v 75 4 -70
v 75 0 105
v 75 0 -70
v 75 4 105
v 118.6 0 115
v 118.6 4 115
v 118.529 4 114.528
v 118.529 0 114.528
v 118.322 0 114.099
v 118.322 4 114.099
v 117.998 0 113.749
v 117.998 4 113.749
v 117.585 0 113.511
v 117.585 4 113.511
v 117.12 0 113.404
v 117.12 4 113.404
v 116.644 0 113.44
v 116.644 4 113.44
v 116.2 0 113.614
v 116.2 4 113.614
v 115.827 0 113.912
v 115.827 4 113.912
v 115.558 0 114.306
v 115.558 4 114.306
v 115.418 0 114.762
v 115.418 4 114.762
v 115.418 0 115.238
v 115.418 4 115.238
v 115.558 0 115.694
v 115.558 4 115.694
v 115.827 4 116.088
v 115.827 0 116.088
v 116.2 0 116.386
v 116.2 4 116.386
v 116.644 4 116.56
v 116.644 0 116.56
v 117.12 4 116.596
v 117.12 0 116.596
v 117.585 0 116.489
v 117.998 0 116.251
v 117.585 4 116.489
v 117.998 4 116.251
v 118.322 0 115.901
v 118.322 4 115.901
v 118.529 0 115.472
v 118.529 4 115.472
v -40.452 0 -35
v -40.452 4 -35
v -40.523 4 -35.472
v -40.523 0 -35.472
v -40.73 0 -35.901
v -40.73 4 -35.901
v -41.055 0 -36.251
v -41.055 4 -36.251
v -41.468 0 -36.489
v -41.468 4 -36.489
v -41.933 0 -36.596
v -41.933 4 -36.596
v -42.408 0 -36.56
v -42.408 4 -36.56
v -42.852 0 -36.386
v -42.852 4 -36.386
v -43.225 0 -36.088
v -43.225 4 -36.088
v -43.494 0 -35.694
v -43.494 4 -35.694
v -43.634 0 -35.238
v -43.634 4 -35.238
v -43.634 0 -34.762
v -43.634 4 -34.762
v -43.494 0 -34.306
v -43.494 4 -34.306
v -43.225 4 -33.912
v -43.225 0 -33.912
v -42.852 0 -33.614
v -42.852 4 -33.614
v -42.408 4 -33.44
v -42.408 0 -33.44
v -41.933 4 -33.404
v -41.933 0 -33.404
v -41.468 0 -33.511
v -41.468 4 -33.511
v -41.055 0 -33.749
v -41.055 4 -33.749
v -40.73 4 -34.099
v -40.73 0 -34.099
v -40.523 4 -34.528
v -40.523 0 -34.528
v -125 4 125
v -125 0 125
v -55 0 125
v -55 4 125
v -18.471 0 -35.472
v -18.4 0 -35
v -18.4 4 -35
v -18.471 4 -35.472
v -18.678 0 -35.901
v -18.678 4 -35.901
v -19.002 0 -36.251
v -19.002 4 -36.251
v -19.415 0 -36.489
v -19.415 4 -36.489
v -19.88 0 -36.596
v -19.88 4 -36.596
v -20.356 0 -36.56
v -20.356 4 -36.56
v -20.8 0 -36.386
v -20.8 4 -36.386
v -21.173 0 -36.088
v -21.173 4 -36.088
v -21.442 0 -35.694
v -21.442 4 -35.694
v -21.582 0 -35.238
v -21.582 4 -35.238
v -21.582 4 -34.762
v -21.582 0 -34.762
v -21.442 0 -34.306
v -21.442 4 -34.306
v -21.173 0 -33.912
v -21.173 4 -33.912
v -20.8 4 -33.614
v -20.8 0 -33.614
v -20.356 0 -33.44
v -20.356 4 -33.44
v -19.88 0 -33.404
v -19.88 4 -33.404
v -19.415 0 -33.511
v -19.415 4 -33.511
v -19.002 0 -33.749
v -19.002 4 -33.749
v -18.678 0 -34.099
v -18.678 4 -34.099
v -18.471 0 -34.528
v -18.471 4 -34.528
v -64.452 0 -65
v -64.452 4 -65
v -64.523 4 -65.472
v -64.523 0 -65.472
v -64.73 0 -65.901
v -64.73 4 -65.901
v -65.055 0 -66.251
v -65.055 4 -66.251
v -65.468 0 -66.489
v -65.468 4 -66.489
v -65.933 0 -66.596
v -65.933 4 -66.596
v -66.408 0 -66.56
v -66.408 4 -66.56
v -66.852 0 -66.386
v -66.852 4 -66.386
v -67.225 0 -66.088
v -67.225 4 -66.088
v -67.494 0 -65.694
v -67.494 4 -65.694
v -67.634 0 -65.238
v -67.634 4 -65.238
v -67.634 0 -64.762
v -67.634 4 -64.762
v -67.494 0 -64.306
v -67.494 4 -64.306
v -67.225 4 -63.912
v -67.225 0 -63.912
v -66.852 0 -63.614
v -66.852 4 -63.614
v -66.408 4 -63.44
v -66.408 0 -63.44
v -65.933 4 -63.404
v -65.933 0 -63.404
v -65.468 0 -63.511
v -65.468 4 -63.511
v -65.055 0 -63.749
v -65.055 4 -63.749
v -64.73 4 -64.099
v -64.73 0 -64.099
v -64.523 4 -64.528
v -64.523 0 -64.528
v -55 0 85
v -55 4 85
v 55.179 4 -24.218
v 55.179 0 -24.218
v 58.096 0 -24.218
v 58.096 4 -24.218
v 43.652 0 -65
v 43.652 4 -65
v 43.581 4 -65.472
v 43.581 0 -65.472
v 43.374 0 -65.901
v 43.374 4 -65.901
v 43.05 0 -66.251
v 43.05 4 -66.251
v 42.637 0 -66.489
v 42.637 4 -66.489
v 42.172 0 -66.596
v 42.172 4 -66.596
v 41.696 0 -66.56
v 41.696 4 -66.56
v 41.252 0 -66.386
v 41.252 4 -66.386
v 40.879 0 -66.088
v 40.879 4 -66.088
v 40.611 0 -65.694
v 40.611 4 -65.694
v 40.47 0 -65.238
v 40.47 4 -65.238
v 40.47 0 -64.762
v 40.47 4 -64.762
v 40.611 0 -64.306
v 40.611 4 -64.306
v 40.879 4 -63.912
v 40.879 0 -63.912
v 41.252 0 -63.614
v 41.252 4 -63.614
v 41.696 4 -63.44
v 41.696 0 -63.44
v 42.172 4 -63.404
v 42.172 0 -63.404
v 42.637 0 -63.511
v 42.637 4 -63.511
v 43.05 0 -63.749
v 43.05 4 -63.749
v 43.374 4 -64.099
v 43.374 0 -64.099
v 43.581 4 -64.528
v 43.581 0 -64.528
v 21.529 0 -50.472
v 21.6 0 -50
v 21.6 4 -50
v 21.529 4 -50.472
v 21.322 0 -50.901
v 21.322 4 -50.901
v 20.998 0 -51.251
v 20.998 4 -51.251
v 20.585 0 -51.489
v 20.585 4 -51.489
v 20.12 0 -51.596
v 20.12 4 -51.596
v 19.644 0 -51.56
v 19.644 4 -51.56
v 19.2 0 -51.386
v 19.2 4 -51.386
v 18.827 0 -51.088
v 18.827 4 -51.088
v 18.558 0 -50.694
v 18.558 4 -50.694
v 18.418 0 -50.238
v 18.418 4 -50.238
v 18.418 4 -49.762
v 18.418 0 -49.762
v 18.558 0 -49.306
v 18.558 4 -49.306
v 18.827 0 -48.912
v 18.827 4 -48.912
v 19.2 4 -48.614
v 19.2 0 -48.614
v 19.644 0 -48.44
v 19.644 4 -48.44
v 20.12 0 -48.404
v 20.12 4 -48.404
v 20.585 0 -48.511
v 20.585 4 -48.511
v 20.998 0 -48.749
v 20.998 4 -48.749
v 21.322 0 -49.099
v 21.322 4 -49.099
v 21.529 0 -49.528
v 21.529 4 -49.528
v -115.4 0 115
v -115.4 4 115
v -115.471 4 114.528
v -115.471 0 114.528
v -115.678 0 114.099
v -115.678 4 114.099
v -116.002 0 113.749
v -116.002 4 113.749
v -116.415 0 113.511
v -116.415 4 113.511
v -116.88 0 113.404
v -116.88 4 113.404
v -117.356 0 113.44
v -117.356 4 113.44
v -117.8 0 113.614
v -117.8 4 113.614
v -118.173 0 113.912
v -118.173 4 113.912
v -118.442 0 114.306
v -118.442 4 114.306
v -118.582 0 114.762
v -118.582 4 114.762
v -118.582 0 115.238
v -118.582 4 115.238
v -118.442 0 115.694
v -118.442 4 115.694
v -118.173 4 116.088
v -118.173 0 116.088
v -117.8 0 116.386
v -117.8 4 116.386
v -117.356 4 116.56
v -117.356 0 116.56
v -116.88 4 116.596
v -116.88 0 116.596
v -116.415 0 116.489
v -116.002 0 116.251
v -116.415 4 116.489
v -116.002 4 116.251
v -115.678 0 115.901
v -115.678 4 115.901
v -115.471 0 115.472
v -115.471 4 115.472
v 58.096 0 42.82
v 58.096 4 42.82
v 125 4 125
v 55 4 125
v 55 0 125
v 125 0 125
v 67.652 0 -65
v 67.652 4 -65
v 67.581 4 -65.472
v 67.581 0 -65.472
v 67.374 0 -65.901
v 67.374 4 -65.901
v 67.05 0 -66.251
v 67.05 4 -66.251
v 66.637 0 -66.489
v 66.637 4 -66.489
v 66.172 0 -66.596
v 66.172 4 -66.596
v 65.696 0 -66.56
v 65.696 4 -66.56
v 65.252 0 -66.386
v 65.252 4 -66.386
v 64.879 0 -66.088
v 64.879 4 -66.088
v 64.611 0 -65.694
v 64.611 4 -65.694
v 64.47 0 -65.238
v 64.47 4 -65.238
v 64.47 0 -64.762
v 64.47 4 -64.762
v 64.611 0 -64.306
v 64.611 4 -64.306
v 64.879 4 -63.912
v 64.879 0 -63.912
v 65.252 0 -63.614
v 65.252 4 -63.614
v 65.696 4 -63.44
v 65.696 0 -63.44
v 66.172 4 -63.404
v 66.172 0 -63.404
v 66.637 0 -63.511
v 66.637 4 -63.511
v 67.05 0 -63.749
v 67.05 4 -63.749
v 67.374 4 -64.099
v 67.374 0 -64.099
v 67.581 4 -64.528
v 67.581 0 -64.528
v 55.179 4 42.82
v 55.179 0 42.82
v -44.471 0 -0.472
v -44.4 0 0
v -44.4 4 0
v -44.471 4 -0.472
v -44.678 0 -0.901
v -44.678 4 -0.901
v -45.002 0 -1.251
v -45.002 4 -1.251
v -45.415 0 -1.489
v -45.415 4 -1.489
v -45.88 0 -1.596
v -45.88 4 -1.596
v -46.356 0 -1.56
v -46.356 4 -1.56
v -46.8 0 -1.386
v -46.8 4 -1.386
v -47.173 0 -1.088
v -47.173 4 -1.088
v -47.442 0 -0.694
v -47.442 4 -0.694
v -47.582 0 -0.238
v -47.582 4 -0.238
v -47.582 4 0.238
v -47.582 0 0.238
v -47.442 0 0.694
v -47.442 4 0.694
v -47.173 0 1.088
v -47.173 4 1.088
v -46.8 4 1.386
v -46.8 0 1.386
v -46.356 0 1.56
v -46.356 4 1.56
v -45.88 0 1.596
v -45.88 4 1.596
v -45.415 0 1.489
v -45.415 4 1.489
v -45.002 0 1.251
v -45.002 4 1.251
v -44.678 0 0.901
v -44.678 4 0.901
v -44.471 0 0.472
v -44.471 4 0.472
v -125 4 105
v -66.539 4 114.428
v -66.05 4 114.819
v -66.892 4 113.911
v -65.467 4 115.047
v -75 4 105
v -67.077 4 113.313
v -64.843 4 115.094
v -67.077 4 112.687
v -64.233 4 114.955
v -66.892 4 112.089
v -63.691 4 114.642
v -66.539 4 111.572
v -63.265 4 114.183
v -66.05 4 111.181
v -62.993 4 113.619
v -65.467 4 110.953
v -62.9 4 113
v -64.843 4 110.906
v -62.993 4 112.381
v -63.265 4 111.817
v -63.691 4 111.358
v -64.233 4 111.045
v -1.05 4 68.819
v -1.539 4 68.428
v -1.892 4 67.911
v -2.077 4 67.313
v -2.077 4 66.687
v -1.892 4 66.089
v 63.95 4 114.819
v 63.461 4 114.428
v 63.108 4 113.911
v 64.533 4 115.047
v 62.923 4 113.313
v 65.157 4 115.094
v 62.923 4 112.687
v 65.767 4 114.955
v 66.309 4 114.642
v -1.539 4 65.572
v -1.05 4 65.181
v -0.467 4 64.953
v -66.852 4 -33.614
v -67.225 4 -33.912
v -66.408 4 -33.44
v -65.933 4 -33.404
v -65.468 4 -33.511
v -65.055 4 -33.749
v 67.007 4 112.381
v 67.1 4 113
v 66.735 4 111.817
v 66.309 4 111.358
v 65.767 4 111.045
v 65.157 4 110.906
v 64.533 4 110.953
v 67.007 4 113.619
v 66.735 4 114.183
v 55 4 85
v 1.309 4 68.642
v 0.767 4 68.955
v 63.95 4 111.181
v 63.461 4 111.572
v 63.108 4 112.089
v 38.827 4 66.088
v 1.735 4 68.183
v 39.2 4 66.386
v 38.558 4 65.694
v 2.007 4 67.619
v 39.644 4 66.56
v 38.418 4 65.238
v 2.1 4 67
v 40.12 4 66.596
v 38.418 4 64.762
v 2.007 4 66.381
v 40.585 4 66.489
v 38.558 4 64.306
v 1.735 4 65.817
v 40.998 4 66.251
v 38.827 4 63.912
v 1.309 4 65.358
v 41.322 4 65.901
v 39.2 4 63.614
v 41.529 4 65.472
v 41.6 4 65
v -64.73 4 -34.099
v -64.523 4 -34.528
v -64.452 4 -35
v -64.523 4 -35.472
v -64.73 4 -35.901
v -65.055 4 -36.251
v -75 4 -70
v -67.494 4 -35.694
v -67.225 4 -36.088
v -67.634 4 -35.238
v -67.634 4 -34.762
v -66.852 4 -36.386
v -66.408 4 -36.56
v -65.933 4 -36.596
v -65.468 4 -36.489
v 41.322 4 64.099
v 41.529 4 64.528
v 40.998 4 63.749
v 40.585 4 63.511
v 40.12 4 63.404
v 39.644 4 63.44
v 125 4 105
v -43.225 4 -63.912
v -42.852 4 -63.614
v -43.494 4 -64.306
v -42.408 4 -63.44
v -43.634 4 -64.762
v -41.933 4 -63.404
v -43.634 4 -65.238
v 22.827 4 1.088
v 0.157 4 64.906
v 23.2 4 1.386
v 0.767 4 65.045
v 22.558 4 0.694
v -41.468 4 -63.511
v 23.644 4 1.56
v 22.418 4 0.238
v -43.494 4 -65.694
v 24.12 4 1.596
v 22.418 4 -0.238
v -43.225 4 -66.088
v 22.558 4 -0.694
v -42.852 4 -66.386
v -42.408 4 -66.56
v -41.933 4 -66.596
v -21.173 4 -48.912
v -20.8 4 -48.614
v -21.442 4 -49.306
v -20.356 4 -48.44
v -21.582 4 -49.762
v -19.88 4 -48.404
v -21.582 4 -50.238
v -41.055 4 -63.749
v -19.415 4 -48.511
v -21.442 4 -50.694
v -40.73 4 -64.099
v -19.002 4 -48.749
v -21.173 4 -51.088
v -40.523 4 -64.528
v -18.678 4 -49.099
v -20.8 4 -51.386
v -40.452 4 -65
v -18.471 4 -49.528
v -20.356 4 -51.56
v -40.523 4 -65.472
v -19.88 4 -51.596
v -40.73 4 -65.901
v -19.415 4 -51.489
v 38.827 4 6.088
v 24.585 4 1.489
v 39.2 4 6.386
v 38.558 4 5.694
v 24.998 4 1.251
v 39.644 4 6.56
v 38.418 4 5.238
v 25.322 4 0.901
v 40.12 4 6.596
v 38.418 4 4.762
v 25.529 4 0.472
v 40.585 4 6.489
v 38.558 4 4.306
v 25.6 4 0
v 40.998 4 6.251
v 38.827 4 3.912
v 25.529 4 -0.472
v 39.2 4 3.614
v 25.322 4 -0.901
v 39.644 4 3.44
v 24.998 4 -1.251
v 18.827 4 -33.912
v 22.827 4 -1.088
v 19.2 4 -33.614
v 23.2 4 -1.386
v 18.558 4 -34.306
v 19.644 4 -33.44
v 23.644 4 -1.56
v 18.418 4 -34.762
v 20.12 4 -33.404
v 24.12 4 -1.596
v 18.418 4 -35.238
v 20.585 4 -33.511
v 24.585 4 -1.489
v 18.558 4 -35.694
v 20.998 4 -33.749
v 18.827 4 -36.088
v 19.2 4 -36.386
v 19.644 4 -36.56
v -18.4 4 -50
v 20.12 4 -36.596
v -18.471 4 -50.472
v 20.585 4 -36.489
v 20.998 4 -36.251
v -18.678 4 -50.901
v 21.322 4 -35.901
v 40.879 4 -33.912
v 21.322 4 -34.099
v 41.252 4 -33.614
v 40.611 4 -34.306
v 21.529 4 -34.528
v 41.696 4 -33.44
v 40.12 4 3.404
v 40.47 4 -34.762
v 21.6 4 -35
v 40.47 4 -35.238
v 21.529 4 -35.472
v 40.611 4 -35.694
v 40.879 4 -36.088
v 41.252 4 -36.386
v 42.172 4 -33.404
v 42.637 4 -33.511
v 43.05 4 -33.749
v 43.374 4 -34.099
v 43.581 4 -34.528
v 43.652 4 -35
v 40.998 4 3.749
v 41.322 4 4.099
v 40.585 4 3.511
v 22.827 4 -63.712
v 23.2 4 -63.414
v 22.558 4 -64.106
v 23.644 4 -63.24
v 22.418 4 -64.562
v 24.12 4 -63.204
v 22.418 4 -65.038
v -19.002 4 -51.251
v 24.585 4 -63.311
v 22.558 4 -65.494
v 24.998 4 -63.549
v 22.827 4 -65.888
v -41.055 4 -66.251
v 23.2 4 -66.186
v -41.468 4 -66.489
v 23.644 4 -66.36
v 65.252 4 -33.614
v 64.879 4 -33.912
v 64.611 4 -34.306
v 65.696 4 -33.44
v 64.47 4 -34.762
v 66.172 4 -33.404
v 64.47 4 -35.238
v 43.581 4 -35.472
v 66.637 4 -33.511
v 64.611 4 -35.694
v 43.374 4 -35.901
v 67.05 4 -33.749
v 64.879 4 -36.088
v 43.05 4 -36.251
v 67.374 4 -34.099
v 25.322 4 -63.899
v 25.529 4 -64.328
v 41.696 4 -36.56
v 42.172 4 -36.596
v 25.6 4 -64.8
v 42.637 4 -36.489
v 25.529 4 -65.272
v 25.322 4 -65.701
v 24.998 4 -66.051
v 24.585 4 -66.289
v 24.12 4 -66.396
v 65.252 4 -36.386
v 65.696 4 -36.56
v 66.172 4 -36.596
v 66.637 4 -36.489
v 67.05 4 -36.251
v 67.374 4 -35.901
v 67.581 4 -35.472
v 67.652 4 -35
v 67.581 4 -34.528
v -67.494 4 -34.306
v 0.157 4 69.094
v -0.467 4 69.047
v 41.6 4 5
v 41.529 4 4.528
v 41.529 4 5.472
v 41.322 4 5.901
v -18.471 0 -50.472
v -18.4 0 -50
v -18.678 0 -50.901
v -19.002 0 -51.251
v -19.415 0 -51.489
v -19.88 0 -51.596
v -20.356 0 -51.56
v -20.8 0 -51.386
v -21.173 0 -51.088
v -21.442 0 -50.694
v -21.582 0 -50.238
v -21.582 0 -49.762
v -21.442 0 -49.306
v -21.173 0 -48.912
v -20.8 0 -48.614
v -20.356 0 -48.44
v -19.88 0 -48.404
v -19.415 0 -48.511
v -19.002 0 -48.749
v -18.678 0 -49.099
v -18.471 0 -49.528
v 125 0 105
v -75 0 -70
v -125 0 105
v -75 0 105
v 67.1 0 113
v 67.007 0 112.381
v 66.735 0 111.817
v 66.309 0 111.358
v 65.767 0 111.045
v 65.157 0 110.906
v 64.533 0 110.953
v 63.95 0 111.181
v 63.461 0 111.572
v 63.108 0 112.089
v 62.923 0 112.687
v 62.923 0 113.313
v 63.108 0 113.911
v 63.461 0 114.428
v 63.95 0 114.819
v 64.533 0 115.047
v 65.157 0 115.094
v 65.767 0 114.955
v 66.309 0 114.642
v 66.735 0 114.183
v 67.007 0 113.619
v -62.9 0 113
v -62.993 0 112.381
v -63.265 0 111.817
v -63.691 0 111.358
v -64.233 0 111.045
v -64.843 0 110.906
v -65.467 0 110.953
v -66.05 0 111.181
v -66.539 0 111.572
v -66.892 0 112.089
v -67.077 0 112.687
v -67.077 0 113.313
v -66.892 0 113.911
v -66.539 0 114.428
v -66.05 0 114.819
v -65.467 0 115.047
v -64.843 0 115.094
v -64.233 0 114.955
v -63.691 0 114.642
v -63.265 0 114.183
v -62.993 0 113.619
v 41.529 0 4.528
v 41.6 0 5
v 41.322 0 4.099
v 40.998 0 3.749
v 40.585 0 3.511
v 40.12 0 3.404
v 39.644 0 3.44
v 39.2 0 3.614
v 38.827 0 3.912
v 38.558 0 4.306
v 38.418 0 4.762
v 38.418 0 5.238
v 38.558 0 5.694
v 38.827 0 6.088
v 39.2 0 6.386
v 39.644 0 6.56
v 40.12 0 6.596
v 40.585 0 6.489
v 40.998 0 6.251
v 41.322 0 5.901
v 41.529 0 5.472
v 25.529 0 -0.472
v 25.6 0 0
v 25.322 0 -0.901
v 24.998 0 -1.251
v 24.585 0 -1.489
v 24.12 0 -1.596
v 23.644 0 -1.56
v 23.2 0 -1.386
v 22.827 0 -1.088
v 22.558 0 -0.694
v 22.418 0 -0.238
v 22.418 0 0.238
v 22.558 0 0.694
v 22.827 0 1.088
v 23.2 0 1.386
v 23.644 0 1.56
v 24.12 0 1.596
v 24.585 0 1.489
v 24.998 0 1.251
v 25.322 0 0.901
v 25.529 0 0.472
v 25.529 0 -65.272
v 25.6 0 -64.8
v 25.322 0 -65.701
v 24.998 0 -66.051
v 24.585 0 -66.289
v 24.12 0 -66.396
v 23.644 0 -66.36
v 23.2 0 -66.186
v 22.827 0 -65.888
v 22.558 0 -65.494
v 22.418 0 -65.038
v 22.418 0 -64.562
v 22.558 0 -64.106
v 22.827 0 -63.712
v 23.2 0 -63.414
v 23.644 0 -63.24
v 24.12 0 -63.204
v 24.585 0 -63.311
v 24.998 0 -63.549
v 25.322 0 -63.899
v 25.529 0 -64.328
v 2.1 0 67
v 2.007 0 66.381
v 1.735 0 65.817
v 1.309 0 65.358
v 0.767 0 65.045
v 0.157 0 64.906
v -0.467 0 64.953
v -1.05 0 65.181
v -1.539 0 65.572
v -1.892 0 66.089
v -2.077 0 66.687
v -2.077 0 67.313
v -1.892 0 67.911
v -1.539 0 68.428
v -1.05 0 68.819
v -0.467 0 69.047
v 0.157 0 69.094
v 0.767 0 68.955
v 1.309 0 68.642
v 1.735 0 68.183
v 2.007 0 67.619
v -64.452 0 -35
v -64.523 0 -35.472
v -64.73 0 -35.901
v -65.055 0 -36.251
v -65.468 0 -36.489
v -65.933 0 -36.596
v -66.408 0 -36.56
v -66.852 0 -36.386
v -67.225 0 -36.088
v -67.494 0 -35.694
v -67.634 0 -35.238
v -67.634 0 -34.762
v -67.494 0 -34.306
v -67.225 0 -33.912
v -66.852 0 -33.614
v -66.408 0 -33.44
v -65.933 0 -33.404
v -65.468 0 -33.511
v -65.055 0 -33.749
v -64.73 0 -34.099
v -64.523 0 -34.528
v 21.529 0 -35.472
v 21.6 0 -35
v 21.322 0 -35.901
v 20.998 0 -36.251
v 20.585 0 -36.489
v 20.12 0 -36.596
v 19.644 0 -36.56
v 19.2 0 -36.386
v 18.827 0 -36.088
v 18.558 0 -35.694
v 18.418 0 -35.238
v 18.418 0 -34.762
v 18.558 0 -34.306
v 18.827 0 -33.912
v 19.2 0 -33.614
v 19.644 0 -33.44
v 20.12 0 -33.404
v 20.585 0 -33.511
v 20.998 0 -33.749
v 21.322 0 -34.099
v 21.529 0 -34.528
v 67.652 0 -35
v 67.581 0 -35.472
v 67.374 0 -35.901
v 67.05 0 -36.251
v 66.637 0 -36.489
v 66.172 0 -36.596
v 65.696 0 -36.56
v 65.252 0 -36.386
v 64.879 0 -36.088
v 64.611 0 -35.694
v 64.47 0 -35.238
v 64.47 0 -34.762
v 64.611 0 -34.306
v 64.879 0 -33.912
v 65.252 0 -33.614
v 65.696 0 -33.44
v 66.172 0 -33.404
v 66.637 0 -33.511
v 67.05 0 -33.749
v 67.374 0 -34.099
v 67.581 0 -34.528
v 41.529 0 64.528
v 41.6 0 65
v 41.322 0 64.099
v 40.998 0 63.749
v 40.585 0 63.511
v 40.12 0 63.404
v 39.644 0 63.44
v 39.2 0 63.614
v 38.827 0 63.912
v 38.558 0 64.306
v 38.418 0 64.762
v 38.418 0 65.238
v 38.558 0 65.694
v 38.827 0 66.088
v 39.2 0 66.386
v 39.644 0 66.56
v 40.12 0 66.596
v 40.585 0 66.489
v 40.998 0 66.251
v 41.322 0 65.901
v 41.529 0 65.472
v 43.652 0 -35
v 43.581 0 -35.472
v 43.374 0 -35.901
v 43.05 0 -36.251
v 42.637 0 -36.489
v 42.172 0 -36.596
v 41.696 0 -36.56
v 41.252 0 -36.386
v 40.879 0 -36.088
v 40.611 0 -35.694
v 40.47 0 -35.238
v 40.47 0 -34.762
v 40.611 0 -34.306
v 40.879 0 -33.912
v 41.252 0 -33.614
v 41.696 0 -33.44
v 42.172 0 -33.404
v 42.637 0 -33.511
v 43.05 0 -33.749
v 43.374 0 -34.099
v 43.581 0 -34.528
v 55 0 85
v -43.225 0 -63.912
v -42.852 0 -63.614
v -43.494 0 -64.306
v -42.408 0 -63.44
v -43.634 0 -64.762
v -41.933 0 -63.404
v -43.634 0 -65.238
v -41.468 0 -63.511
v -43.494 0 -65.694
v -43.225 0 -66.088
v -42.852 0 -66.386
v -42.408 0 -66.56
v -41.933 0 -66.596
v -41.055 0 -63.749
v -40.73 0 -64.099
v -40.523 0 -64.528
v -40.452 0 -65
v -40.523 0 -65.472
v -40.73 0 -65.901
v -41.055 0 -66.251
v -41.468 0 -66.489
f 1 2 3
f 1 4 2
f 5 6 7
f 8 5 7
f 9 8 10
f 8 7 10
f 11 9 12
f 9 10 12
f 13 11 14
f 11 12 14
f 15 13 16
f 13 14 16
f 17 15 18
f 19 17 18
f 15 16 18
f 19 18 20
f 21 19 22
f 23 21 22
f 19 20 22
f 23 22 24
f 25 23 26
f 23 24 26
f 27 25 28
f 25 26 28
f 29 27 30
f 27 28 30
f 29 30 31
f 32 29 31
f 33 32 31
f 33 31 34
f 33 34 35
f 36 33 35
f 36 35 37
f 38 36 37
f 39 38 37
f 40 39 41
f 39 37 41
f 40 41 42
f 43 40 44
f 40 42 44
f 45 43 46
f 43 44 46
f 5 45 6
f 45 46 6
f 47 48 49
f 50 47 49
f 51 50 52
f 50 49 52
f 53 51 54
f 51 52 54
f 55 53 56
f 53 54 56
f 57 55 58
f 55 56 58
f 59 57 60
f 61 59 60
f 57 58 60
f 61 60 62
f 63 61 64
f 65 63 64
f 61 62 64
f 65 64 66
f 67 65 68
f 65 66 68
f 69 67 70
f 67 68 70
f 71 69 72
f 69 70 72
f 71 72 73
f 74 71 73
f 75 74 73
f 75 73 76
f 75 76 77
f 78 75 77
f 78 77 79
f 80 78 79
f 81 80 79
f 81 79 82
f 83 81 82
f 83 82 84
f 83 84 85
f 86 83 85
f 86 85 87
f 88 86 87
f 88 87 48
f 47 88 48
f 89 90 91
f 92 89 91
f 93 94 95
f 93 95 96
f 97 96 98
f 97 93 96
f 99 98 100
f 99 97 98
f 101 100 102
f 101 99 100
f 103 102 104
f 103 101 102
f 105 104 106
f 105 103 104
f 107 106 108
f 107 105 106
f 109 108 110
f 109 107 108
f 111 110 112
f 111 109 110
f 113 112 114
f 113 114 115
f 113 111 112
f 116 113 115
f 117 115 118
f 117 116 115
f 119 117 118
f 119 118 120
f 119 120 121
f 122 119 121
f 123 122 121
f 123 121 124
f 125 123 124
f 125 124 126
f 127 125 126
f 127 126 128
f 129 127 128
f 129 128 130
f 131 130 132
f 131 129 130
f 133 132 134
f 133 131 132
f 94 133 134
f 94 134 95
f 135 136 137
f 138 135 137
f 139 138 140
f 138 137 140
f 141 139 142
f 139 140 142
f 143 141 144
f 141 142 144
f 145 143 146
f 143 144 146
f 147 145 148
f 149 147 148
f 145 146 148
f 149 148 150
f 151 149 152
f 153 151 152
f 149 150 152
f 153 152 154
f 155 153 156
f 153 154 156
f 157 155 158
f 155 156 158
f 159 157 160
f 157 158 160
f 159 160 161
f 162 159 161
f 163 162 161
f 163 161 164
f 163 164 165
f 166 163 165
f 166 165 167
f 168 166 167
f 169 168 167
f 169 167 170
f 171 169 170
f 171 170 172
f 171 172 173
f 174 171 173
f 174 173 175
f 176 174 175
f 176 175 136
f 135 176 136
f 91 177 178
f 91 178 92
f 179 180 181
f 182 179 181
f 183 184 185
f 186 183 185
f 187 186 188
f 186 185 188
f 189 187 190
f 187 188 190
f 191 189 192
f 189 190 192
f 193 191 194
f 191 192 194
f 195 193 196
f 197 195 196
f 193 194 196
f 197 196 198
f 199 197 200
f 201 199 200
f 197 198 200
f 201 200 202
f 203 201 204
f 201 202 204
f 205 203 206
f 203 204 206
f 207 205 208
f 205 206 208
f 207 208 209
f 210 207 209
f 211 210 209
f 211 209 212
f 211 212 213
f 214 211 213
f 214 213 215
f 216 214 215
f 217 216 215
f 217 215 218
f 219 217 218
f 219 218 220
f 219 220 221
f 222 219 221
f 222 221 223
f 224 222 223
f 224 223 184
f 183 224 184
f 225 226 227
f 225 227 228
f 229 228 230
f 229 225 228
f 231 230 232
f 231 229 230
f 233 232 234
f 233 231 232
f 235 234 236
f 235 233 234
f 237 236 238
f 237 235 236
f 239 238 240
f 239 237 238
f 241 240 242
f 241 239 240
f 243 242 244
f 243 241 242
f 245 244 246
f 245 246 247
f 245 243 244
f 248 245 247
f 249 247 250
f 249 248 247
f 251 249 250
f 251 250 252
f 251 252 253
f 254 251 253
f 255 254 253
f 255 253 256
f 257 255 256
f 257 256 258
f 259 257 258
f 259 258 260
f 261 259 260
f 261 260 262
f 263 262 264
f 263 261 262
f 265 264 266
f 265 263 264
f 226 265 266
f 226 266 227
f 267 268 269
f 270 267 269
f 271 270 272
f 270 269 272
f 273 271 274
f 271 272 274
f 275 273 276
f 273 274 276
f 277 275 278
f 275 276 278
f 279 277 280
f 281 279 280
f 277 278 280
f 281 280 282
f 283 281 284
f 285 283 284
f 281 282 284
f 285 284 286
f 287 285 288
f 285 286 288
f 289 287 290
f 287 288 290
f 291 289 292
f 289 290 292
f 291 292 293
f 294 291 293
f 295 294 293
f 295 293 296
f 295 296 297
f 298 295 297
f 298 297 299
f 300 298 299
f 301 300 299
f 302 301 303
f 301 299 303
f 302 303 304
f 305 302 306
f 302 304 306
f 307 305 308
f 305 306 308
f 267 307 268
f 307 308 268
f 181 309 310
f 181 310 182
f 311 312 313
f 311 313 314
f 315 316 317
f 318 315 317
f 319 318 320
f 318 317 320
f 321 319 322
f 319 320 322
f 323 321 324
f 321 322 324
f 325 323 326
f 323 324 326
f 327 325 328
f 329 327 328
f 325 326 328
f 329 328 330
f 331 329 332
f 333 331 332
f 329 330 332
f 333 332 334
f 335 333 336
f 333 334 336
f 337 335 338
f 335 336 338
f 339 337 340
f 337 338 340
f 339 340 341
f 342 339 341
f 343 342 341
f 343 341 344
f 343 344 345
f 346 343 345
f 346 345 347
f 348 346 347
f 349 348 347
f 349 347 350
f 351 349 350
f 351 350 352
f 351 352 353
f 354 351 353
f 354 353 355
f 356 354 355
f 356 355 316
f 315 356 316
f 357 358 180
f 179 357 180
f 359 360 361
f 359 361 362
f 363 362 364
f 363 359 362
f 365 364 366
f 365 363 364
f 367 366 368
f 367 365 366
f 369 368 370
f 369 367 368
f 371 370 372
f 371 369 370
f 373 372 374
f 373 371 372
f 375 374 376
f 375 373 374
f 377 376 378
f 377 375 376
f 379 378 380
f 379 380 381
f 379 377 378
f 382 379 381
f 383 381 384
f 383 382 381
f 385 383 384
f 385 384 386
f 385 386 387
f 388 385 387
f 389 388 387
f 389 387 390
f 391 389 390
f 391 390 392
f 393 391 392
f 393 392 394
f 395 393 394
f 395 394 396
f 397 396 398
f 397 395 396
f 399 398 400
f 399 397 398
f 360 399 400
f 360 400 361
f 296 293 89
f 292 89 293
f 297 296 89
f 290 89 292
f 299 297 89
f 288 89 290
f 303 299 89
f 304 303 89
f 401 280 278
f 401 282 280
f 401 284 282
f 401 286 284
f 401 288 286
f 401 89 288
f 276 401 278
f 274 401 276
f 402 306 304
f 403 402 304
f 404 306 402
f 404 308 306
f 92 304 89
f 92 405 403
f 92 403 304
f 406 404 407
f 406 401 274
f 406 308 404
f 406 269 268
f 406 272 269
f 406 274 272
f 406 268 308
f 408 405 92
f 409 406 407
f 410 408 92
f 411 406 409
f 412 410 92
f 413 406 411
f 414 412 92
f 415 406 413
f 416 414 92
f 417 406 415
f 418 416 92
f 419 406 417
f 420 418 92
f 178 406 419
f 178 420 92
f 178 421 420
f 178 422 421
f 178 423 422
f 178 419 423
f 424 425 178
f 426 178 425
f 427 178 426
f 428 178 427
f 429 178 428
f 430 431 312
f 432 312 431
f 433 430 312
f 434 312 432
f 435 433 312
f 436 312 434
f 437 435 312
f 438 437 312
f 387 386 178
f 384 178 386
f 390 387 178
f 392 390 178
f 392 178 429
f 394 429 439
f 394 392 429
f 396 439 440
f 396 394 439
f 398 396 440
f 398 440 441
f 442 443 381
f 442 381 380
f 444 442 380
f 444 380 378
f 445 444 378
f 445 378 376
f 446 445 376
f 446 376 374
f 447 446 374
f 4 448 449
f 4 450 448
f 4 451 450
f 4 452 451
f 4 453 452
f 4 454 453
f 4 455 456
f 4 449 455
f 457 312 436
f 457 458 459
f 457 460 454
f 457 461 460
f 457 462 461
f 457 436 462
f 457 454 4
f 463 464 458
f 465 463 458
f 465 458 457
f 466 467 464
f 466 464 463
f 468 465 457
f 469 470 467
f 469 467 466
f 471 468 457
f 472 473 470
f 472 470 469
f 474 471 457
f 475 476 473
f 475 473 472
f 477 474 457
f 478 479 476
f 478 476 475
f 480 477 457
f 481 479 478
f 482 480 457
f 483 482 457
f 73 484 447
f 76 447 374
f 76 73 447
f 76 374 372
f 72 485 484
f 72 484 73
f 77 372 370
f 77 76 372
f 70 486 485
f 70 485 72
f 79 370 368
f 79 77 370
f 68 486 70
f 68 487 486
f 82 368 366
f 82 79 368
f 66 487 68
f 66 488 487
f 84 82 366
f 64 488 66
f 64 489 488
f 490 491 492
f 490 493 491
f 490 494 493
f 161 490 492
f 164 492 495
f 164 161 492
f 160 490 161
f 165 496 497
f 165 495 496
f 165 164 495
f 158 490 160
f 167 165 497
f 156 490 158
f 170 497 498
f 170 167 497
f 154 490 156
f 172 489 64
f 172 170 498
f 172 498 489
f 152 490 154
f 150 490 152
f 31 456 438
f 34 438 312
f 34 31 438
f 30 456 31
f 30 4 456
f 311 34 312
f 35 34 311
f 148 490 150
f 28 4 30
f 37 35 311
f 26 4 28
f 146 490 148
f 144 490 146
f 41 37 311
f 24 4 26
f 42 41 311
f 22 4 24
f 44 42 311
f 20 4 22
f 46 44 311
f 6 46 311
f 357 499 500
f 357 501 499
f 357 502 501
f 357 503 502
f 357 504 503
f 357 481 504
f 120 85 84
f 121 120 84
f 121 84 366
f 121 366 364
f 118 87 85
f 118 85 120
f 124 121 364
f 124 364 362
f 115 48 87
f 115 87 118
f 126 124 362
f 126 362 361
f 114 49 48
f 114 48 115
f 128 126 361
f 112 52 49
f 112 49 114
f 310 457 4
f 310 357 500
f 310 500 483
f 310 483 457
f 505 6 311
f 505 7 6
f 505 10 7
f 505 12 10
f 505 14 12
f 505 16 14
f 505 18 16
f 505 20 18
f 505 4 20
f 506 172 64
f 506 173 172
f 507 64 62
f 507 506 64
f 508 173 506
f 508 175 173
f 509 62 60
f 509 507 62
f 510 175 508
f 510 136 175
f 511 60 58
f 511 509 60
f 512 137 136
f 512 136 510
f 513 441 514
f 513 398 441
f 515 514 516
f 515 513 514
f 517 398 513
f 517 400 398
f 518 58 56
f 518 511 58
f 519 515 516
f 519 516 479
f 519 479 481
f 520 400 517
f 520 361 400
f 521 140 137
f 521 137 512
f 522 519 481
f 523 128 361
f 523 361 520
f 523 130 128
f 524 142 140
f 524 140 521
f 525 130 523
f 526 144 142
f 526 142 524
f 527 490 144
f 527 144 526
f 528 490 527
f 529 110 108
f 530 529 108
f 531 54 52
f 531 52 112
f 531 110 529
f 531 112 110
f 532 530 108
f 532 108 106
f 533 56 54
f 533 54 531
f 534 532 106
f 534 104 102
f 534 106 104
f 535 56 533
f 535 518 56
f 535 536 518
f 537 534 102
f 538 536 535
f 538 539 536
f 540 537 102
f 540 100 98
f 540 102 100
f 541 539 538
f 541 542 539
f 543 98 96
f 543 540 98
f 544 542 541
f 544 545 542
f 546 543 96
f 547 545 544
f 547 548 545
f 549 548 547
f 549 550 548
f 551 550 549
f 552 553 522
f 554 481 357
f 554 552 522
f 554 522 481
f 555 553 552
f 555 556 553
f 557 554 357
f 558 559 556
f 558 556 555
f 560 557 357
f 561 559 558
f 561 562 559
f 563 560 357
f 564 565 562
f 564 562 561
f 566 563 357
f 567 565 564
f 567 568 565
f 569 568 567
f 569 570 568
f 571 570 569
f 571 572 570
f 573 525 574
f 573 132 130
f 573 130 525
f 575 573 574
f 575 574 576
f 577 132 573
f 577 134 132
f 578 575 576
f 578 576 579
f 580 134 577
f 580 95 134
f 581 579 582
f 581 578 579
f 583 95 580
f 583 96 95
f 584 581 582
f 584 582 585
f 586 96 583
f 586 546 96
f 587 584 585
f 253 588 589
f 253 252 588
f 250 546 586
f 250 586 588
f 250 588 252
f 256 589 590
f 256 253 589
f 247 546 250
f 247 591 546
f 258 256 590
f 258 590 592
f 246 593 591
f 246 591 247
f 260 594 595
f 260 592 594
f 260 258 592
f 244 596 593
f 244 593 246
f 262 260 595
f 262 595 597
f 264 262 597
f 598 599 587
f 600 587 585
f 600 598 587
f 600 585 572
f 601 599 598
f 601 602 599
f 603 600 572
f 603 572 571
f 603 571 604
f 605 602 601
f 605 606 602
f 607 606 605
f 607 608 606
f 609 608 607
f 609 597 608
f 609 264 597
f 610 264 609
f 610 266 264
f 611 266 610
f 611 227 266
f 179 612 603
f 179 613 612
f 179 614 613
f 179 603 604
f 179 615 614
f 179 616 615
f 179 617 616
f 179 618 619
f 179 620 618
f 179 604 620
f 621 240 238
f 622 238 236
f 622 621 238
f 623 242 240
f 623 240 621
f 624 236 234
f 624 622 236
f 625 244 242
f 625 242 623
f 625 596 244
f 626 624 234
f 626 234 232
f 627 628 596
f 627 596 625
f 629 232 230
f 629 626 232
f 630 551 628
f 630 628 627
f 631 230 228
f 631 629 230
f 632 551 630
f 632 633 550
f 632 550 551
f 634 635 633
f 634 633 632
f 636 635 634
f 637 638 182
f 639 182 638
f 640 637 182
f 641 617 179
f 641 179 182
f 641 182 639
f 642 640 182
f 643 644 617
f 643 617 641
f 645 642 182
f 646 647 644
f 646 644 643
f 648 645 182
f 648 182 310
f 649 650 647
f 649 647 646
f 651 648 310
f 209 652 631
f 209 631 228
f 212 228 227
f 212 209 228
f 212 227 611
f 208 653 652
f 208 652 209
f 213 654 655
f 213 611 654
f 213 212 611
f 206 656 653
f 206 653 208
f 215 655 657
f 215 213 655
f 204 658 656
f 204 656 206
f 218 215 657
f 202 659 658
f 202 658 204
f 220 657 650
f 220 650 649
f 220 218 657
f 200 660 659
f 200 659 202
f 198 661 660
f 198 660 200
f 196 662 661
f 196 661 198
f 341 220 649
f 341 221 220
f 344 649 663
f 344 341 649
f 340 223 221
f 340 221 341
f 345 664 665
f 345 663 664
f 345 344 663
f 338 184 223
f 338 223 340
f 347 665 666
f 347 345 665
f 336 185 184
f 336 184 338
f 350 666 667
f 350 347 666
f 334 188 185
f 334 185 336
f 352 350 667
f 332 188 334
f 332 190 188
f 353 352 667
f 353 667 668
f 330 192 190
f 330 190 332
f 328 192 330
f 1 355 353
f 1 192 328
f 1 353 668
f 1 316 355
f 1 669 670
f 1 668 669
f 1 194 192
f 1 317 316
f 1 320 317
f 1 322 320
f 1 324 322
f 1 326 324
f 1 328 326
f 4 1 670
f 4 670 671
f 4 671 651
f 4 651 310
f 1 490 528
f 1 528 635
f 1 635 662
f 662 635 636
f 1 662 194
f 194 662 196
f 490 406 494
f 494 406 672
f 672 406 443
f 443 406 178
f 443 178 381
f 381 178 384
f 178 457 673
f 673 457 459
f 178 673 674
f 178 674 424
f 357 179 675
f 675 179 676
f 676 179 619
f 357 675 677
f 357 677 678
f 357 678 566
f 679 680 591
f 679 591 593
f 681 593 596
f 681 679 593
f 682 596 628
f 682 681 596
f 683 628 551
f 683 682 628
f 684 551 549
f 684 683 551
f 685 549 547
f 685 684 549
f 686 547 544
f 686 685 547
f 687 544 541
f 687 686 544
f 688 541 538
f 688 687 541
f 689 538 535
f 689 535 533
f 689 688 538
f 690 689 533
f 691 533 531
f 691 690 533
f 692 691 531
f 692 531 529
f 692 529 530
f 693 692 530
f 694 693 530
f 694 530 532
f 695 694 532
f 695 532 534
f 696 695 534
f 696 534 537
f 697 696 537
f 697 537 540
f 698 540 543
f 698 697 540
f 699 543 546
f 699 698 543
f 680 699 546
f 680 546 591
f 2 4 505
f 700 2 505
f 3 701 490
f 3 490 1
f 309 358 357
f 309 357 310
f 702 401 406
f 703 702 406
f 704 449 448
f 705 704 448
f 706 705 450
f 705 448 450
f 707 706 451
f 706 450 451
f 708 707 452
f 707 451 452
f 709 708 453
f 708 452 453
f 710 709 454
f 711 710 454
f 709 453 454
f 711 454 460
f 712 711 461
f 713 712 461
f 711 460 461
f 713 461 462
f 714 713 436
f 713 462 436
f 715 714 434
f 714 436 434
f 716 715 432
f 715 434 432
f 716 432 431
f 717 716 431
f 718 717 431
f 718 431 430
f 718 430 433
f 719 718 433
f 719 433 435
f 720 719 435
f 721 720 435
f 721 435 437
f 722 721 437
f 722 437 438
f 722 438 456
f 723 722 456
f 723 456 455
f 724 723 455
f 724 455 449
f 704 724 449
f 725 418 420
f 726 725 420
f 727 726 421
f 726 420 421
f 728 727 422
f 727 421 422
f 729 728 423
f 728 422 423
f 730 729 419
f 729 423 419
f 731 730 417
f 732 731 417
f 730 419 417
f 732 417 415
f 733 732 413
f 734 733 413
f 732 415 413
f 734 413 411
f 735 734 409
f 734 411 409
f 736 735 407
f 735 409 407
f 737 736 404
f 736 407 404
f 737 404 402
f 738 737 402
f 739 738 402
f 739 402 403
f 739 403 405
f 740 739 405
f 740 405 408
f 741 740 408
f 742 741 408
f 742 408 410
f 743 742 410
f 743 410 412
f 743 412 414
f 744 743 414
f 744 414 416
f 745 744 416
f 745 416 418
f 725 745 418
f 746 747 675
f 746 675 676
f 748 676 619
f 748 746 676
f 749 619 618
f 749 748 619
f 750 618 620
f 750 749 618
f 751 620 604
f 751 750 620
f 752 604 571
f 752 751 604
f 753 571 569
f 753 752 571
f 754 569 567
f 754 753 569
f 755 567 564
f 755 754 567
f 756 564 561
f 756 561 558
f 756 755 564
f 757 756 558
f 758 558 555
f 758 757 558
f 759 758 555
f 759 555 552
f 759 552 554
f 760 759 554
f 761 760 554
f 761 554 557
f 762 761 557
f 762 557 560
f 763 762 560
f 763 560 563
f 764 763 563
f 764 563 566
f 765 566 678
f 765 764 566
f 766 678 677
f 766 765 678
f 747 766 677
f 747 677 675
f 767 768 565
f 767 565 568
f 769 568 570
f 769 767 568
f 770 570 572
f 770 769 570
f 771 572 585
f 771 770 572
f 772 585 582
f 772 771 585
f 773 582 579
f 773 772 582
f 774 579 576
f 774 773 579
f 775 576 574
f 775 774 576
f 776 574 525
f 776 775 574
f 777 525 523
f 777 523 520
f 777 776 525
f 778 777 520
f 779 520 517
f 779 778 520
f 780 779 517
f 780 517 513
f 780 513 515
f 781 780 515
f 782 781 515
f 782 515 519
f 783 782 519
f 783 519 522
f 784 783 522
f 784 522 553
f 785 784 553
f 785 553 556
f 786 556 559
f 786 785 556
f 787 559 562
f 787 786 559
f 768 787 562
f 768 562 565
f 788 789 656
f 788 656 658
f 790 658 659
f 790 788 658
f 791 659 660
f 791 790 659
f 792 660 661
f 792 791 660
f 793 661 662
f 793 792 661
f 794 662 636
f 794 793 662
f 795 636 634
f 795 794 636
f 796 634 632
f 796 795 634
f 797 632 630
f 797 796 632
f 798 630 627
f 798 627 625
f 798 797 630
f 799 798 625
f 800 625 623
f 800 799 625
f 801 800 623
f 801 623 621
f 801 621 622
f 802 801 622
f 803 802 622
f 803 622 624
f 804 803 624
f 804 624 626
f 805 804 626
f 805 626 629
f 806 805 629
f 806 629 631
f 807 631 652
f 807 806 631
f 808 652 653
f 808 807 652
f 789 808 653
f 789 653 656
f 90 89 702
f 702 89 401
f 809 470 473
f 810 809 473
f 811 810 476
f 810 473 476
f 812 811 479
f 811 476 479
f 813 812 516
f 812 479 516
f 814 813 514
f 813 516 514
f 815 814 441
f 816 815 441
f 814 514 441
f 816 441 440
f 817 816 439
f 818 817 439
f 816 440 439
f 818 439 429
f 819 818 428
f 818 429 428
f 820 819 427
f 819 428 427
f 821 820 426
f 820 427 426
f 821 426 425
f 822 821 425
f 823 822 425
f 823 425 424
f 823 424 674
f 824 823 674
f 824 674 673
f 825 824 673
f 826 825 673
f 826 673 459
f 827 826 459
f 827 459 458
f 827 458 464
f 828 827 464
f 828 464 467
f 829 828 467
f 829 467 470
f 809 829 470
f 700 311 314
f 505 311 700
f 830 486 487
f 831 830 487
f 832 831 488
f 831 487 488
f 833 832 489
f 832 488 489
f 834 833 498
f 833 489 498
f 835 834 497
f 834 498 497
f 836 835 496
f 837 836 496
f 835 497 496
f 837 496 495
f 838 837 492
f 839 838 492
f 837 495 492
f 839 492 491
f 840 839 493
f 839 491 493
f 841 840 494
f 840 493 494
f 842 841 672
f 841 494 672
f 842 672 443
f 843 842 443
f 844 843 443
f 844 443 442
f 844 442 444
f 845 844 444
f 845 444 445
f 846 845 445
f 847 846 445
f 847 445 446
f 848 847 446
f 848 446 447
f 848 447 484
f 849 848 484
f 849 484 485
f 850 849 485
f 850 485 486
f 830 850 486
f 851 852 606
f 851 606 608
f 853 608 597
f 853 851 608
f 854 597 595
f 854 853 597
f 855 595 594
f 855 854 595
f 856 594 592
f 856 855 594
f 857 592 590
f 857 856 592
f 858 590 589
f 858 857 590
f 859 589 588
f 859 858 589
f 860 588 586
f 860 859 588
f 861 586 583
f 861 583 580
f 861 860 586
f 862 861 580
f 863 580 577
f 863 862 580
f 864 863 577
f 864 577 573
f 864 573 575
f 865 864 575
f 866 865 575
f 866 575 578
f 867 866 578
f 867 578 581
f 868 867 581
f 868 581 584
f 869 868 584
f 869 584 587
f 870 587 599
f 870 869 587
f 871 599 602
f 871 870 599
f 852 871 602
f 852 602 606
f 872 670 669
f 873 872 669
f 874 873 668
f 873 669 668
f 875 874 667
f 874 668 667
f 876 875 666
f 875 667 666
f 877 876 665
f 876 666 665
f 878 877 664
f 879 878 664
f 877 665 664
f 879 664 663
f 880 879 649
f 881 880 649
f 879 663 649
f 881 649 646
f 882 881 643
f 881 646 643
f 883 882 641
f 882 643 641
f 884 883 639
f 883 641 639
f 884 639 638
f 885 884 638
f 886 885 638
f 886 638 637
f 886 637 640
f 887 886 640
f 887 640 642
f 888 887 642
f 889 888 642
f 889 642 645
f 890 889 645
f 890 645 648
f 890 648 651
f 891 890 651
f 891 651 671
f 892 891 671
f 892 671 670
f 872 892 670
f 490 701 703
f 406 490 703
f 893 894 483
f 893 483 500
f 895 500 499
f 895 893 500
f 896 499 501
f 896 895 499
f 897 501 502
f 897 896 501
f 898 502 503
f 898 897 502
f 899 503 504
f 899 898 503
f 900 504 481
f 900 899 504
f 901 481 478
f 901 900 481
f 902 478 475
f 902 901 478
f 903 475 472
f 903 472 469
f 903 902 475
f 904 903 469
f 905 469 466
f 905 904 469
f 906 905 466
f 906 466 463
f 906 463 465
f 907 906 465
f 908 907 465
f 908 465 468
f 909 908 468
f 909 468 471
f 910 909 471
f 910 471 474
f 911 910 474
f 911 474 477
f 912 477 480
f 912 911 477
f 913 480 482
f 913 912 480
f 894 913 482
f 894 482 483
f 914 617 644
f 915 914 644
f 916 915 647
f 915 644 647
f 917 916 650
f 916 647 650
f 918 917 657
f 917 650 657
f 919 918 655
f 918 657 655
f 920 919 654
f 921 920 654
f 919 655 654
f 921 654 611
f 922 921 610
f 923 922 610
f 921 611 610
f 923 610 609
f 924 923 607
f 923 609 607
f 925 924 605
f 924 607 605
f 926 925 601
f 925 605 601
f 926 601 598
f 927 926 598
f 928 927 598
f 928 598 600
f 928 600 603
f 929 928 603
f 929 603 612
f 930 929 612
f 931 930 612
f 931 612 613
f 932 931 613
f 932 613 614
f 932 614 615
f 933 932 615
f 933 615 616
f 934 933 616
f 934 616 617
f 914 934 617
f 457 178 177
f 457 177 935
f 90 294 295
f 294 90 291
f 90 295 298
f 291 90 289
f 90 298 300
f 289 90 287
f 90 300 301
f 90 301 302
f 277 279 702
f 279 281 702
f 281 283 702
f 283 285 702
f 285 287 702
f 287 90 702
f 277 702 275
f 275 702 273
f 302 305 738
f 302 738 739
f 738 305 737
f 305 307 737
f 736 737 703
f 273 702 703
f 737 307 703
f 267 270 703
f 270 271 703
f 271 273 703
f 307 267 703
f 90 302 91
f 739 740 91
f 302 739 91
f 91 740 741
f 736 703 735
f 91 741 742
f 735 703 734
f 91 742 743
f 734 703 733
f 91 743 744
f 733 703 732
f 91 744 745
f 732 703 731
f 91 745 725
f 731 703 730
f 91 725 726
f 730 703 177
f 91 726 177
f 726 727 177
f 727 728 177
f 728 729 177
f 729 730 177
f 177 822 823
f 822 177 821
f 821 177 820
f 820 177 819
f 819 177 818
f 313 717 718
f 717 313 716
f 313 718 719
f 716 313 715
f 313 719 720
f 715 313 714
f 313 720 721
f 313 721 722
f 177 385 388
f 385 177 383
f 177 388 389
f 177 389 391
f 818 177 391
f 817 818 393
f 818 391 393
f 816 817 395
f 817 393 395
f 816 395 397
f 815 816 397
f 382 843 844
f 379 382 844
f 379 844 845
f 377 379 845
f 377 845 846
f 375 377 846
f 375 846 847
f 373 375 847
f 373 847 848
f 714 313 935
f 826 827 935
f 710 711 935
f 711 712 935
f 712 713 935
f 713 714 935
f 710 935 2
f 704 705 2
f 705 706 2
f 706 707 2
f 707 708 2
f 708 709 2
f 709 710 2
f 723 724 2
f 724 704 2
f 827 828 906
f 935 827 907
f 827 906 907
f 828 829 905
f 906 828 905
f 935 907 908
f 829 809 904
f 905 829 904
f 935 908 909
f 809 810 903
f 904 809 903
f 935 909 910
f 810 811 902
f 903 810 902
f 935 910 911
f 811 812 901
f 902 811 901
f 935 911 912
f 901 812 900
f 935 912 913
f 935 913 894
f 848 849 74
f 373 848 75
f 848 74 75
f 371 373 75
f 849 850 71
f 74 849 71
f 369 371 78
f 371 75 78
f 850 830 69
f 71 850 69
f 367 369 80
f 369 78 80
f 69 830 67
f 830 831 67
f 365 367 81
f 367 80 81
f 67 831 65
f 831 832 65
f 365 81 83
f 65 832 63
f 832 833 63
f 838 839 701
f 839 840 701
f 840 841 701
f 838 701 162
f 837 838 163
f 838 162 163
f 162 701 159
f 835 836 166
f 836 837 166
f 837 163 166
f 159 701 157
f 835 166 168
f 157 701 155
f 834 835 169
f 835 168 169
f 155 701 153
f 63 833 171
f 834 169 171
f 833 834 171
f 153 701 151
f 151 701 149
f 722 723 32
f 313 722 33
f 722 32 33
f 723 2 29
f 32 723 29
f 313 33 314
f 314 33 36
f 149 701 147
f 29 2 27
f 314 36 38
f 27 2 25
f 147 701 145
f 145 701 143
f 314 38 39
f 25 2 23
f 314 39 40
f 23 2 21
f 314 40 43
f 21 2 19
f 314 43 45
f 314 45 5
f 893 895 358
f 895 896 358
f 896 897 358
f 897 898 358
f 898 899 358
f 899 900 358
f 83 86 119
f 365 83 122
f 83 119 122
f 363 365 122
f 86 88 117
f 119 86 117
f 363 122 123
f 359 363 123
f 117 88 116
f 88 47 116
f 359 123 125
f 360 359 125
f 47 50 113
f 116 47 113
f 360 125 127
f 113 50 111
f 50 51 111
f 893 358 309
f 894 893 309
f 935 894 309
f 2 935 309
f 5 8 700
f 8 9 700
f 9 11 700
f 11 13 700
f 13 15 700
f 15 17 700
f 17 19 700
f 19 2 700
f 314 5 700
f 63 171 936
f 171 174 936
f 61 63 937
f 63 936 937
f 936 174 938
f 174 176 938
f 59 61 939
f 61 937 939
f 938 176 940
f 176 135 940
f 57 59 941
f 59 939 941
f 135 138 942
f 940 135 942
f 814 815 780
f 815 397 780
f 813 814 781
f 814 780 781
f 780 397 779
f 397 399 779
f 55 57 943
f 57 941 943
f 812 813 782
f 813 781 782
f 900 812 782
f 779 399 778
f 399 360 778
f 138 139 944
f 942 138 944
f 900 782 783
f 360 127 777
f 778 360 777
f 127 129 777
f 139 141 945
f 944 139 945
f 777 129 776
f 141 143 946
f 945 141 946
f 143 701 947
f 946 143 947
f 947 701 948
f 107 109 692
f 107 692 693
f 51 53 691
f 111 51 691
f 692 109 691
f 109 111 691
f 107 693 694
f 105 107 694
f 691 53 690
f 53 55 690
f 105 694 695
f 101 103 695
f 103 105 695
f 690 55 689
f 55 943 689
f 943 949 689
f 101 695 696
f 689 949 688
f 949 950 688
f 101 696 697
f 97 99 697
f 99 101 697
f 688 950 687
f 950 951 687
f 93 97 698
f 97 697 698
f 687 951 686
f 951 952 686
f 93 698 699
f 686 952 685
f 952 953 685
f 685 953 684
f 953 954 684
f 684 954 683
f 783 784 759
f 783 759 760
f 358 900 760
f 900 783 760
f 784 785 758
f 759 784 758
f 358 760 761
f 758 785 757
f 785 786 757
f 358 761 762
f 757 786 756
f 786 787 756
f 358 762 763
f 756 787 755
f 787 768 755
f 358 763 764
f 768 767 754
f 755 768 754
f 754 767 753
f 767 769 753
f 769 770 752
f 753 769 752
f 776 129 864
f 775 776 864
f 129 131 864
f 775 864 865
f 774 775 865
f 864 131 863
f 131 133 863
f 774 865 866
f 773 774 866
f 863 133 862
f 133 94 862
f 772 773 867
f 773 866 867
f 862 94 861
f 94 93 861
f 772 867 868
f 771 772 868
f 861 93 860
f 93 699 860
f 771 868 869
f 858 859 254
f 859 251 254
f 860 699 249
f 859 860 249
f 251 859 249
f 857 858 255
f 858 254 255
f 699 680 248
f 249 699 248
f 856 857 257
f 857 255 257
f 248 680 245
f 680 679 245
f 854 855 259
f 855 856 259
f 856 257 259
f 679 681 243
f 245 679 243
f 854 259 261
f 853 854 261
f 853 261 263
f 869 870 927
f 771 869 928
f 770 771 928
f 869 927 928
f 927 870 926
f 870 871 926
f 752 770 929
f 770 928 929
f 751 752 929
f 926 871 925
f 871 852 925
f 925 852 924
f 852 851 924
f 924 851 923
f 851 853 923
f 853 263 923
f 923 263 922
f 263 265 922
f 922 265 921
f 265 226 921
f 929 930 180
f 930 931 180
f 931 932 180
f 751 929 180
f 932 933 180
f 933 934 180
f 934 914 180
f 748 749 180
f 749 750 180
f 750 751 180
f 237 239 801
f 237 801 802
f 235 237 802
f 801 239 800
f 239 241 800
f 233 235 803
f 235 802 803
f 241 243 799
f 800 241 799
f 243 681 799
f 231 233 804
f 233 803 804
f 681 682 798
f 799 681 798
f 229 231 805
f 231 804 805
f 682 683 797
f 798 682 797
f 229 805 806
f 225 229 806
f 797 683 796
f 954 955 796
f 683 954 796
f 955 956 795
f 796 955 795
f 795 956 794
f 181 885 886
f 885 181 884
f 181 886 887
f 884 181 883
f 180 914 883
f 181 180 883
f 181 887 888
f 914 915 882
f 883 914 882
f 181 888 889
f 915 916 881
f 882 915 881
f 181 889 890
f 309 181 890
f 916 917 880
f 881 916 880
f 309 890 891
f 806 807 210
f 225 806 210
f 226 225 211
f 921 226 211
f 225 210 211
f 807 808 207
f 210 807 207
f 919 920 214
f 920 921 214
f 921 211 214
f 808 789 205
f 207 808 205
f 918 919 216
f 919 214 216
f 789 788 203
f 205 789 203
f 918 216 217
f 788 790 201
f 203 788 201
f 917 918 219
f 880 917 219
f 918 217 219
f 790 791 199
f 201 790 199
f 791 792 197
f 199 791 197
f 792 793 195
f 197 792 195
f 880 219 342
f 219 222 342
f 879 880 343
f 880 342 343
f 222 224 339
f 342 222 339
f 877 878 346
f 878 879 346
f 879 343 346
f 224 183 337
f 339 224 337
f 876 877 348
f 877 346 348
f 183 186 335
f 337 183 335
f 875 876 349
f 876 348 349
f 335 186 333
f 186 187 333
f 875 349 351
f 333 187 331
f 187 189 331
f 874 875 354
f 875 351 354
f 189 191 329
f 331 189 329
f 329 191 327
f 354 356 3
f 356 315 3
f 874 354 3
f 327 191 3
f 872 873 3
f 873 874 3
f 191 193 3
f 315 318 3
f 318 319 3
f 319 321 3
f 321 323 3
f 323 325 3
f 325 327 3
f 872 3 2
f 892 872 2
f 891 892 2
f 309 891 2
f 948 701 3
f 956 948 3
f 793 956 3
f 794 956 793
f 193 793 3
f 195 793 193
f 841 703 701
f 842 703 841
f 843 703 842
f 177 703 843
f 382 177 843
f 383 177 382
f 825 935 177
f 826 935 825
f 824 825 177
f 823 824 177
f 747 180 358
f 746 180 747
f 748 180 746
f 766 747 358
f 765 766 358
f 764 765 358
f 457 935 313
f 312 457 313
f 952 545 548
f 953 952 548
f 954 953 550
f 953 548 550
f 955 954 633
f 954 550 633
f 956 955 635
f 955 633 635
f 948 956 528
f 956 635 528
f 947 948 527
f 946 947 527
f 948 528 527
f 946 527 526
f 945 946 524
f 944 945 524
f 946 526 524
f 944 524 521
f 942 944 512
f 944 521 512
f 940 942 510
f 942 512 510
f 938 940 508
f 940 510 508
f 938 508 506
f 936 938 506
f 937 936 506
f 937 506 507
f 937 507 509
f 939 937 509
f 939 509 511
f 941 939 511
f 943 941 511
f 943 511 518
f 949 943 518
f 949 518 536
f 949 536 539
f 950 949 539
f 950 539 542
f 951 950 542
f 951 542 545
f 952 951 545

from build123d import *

# Parameters (mm, degrees)
SKETCH_1_W          = 150
SKETCH_1_H          = 145
SKETCH_1_R          = 1.6
SKETCH_1_W_2        = 2.916573318
SKETCH_1_H_2        = 67.038706503
EXTRUDE_1_DEPTH     = 4
SKETCH_2_R          = 2.1
SKETCH_2_R_2        = 1.6
CUT_EXTRUDE_1_DEPTH = 5
SKETCH_5_W          = 150
SKETCH_5_H          = 10
EXTRUDE_4_DEPTH     = 4
SKETCH_10_W         = 20
SKETCH_10_H         = 40
EXTRUDE_9_DEPTH     = 4
SKETCH_12_R         = 2.1
CUT_EXTRUDE_2_DEPTH = 5
SKETCH_15_W         = 50
SKETCH_15_H         = 20
SKETCH_15_R         = 1.6
EXTRUDE_11_DEPTH    = 4


with BuildPart() as part:
    # 草图1 → 凸台-拉伸1 (new body)
    with BuildSketch(Plane(origin=(0, 0, 0), x_dir=(1, 0, 0), z_dir=(0, 1, 0))):
        with Locations((0, -2.5)):
            Rectangle(SKETCH_1_W, SKETCH_1_H)
        with Locations((-20, 50)):
            Circle(SKETCH_1_R, mode=Mode.SUBTRACT)
        with Locations((20, 50)):
            Circle(SKETCH_1_R, mode=Mode.SUBTRACT)
        with Locations((-20, 35)):
            Circle(SKETCH_1_R, mode=Mode.SUBTRACT)
        with Locations((20, 35)):
            Circle(SKETCH_1_R, mode=Mode.SUBTRACT)
        with Locations((-46, 0)):
            Circle(SKETCH_1_R, mode=Mode.SUBTRACT)
        with Locations((24, 0)):
            Circle(SKETCH_1_R, mode=Mode.SUBTRACT)
        with Locations((24, 64.8)):
            Circle(SKETCH_1_R, mode=Mode.SUBTRACT)
        with Locations((40, -5)):
            Circle(SKETCH_1_R, mode=Mode.SUBTRACT)
        with Locations((40, -65)):
            Circle(SKETCH_1_R, mode=Mode.SUBTRACT)
        with Locations((56.637514727, -9.301063596)):
            Rectangle(SKETCH_1_W_2, SKETCH_1_H_2, mode=Mode.SUBTRACT)
    extrude(amount=EXTRUDE_1_DEPTH)

    # 草图2 → 切除-拉伸1 (cut, through all)
    with BuildSketch(Plane(origin=(0, 4, 0), x_dir=(1, 0, 0), z_dir=(0, 1, 0))):
        with Locations((0, -67)):
            Circle(SKETCH_2_R)
        with Locations((-66.052318668, 65)):
            Circle(SKETCH_2_R_2)
        with Locations((-66.052318668, 35)):
            Circle(SKETCH_2_R_2)
        with Locations((-42.052318668, 65)):
            Circle(SKETCH_2_R_2)
        with Locations((-42.052318668, 35)):
            Circle(SKETCH_2_R_2)
        with Locations((42.052318668, 35)):
            Circle(SKETCH_2_R_2)
        with Locations((66.052318668, 35)):
            Circle(SKETCH_2_R_2)
        with Locations((66.052318668, 65)):
            Circle(SKETCH_2_R_2)
        with Locations((42.052318668, 65)):
            Circle(SKETCH_2_R_2)
    extrude(amount=-CUT_EXTRUDE_1_DEPTH, mode=Mode.SUBTRACT)

    # 草图5 → 凸台-拉伸4 (add)
    with BuildSketch(Plane(origin=(0, 4, 0), x_dir=(1, 0, 0), z_dir=(0, 1, 0))):
        with Locations((0, -80)):
            Rectangle(SKETCH_5_W, SKETCH_5_H)
    extrude(amount=-EXTRUDE_4_DEPTH)

    # 草图10 → 凸台-拉伸9 (add)
    with BuildSketch(Plane.XZ):
        with Locations((-65, 105)):
            Rectangle(SKETCH_10_W, SKETCH_10_H)
        with Locations((65, 105)):
            Rectangle(SKETCH_10_W, SKETCH_10_H)
    extrude(amount=-EXTRUDE_9_DEPTH)

    # 草图12 → 切除-拉伸2 (cut, through all)
    with BuildSketch(Plane(origin=(0, 4, 0), x_dir=(1, 0, 0), z_dir=(0, 1, 0))):
        with Locations((-65, -113)):
            Circle(SKETCH_12_R)
        with Locations((65, -113)):
            Circle(SKETCH_12_R)
    extrude(amount=-CUT_EXTRUDE_2_DEPTH, mode=Mode.SUBTRACT)

    # 草图15 → 凸台-拉伸11 (add)
    with BuildSketch(Plane(origin=(0, 4, 0), x_dir=(1, 0, 0), z_dir=(0, 1, 0))):
        with Locations((100, -115)):
            Rectangle(SKETCH_15_W, SKETCH_15_H)
        with Locations((117, -115)):
            Circle(SKETCH_15_R, mode=Mode.SUBTRACT)
        with Locations((-100, -115)):
            Rectangle(SKETCH_15_W, SKETCH_15_H)
        with Locations((-117, -115)):
            Circle(SKETCH_15_R, mode=Mode.SUBTRACT)
    extrude(amount=-EXTRUDE_11_DEPTH)


solid = part.part
